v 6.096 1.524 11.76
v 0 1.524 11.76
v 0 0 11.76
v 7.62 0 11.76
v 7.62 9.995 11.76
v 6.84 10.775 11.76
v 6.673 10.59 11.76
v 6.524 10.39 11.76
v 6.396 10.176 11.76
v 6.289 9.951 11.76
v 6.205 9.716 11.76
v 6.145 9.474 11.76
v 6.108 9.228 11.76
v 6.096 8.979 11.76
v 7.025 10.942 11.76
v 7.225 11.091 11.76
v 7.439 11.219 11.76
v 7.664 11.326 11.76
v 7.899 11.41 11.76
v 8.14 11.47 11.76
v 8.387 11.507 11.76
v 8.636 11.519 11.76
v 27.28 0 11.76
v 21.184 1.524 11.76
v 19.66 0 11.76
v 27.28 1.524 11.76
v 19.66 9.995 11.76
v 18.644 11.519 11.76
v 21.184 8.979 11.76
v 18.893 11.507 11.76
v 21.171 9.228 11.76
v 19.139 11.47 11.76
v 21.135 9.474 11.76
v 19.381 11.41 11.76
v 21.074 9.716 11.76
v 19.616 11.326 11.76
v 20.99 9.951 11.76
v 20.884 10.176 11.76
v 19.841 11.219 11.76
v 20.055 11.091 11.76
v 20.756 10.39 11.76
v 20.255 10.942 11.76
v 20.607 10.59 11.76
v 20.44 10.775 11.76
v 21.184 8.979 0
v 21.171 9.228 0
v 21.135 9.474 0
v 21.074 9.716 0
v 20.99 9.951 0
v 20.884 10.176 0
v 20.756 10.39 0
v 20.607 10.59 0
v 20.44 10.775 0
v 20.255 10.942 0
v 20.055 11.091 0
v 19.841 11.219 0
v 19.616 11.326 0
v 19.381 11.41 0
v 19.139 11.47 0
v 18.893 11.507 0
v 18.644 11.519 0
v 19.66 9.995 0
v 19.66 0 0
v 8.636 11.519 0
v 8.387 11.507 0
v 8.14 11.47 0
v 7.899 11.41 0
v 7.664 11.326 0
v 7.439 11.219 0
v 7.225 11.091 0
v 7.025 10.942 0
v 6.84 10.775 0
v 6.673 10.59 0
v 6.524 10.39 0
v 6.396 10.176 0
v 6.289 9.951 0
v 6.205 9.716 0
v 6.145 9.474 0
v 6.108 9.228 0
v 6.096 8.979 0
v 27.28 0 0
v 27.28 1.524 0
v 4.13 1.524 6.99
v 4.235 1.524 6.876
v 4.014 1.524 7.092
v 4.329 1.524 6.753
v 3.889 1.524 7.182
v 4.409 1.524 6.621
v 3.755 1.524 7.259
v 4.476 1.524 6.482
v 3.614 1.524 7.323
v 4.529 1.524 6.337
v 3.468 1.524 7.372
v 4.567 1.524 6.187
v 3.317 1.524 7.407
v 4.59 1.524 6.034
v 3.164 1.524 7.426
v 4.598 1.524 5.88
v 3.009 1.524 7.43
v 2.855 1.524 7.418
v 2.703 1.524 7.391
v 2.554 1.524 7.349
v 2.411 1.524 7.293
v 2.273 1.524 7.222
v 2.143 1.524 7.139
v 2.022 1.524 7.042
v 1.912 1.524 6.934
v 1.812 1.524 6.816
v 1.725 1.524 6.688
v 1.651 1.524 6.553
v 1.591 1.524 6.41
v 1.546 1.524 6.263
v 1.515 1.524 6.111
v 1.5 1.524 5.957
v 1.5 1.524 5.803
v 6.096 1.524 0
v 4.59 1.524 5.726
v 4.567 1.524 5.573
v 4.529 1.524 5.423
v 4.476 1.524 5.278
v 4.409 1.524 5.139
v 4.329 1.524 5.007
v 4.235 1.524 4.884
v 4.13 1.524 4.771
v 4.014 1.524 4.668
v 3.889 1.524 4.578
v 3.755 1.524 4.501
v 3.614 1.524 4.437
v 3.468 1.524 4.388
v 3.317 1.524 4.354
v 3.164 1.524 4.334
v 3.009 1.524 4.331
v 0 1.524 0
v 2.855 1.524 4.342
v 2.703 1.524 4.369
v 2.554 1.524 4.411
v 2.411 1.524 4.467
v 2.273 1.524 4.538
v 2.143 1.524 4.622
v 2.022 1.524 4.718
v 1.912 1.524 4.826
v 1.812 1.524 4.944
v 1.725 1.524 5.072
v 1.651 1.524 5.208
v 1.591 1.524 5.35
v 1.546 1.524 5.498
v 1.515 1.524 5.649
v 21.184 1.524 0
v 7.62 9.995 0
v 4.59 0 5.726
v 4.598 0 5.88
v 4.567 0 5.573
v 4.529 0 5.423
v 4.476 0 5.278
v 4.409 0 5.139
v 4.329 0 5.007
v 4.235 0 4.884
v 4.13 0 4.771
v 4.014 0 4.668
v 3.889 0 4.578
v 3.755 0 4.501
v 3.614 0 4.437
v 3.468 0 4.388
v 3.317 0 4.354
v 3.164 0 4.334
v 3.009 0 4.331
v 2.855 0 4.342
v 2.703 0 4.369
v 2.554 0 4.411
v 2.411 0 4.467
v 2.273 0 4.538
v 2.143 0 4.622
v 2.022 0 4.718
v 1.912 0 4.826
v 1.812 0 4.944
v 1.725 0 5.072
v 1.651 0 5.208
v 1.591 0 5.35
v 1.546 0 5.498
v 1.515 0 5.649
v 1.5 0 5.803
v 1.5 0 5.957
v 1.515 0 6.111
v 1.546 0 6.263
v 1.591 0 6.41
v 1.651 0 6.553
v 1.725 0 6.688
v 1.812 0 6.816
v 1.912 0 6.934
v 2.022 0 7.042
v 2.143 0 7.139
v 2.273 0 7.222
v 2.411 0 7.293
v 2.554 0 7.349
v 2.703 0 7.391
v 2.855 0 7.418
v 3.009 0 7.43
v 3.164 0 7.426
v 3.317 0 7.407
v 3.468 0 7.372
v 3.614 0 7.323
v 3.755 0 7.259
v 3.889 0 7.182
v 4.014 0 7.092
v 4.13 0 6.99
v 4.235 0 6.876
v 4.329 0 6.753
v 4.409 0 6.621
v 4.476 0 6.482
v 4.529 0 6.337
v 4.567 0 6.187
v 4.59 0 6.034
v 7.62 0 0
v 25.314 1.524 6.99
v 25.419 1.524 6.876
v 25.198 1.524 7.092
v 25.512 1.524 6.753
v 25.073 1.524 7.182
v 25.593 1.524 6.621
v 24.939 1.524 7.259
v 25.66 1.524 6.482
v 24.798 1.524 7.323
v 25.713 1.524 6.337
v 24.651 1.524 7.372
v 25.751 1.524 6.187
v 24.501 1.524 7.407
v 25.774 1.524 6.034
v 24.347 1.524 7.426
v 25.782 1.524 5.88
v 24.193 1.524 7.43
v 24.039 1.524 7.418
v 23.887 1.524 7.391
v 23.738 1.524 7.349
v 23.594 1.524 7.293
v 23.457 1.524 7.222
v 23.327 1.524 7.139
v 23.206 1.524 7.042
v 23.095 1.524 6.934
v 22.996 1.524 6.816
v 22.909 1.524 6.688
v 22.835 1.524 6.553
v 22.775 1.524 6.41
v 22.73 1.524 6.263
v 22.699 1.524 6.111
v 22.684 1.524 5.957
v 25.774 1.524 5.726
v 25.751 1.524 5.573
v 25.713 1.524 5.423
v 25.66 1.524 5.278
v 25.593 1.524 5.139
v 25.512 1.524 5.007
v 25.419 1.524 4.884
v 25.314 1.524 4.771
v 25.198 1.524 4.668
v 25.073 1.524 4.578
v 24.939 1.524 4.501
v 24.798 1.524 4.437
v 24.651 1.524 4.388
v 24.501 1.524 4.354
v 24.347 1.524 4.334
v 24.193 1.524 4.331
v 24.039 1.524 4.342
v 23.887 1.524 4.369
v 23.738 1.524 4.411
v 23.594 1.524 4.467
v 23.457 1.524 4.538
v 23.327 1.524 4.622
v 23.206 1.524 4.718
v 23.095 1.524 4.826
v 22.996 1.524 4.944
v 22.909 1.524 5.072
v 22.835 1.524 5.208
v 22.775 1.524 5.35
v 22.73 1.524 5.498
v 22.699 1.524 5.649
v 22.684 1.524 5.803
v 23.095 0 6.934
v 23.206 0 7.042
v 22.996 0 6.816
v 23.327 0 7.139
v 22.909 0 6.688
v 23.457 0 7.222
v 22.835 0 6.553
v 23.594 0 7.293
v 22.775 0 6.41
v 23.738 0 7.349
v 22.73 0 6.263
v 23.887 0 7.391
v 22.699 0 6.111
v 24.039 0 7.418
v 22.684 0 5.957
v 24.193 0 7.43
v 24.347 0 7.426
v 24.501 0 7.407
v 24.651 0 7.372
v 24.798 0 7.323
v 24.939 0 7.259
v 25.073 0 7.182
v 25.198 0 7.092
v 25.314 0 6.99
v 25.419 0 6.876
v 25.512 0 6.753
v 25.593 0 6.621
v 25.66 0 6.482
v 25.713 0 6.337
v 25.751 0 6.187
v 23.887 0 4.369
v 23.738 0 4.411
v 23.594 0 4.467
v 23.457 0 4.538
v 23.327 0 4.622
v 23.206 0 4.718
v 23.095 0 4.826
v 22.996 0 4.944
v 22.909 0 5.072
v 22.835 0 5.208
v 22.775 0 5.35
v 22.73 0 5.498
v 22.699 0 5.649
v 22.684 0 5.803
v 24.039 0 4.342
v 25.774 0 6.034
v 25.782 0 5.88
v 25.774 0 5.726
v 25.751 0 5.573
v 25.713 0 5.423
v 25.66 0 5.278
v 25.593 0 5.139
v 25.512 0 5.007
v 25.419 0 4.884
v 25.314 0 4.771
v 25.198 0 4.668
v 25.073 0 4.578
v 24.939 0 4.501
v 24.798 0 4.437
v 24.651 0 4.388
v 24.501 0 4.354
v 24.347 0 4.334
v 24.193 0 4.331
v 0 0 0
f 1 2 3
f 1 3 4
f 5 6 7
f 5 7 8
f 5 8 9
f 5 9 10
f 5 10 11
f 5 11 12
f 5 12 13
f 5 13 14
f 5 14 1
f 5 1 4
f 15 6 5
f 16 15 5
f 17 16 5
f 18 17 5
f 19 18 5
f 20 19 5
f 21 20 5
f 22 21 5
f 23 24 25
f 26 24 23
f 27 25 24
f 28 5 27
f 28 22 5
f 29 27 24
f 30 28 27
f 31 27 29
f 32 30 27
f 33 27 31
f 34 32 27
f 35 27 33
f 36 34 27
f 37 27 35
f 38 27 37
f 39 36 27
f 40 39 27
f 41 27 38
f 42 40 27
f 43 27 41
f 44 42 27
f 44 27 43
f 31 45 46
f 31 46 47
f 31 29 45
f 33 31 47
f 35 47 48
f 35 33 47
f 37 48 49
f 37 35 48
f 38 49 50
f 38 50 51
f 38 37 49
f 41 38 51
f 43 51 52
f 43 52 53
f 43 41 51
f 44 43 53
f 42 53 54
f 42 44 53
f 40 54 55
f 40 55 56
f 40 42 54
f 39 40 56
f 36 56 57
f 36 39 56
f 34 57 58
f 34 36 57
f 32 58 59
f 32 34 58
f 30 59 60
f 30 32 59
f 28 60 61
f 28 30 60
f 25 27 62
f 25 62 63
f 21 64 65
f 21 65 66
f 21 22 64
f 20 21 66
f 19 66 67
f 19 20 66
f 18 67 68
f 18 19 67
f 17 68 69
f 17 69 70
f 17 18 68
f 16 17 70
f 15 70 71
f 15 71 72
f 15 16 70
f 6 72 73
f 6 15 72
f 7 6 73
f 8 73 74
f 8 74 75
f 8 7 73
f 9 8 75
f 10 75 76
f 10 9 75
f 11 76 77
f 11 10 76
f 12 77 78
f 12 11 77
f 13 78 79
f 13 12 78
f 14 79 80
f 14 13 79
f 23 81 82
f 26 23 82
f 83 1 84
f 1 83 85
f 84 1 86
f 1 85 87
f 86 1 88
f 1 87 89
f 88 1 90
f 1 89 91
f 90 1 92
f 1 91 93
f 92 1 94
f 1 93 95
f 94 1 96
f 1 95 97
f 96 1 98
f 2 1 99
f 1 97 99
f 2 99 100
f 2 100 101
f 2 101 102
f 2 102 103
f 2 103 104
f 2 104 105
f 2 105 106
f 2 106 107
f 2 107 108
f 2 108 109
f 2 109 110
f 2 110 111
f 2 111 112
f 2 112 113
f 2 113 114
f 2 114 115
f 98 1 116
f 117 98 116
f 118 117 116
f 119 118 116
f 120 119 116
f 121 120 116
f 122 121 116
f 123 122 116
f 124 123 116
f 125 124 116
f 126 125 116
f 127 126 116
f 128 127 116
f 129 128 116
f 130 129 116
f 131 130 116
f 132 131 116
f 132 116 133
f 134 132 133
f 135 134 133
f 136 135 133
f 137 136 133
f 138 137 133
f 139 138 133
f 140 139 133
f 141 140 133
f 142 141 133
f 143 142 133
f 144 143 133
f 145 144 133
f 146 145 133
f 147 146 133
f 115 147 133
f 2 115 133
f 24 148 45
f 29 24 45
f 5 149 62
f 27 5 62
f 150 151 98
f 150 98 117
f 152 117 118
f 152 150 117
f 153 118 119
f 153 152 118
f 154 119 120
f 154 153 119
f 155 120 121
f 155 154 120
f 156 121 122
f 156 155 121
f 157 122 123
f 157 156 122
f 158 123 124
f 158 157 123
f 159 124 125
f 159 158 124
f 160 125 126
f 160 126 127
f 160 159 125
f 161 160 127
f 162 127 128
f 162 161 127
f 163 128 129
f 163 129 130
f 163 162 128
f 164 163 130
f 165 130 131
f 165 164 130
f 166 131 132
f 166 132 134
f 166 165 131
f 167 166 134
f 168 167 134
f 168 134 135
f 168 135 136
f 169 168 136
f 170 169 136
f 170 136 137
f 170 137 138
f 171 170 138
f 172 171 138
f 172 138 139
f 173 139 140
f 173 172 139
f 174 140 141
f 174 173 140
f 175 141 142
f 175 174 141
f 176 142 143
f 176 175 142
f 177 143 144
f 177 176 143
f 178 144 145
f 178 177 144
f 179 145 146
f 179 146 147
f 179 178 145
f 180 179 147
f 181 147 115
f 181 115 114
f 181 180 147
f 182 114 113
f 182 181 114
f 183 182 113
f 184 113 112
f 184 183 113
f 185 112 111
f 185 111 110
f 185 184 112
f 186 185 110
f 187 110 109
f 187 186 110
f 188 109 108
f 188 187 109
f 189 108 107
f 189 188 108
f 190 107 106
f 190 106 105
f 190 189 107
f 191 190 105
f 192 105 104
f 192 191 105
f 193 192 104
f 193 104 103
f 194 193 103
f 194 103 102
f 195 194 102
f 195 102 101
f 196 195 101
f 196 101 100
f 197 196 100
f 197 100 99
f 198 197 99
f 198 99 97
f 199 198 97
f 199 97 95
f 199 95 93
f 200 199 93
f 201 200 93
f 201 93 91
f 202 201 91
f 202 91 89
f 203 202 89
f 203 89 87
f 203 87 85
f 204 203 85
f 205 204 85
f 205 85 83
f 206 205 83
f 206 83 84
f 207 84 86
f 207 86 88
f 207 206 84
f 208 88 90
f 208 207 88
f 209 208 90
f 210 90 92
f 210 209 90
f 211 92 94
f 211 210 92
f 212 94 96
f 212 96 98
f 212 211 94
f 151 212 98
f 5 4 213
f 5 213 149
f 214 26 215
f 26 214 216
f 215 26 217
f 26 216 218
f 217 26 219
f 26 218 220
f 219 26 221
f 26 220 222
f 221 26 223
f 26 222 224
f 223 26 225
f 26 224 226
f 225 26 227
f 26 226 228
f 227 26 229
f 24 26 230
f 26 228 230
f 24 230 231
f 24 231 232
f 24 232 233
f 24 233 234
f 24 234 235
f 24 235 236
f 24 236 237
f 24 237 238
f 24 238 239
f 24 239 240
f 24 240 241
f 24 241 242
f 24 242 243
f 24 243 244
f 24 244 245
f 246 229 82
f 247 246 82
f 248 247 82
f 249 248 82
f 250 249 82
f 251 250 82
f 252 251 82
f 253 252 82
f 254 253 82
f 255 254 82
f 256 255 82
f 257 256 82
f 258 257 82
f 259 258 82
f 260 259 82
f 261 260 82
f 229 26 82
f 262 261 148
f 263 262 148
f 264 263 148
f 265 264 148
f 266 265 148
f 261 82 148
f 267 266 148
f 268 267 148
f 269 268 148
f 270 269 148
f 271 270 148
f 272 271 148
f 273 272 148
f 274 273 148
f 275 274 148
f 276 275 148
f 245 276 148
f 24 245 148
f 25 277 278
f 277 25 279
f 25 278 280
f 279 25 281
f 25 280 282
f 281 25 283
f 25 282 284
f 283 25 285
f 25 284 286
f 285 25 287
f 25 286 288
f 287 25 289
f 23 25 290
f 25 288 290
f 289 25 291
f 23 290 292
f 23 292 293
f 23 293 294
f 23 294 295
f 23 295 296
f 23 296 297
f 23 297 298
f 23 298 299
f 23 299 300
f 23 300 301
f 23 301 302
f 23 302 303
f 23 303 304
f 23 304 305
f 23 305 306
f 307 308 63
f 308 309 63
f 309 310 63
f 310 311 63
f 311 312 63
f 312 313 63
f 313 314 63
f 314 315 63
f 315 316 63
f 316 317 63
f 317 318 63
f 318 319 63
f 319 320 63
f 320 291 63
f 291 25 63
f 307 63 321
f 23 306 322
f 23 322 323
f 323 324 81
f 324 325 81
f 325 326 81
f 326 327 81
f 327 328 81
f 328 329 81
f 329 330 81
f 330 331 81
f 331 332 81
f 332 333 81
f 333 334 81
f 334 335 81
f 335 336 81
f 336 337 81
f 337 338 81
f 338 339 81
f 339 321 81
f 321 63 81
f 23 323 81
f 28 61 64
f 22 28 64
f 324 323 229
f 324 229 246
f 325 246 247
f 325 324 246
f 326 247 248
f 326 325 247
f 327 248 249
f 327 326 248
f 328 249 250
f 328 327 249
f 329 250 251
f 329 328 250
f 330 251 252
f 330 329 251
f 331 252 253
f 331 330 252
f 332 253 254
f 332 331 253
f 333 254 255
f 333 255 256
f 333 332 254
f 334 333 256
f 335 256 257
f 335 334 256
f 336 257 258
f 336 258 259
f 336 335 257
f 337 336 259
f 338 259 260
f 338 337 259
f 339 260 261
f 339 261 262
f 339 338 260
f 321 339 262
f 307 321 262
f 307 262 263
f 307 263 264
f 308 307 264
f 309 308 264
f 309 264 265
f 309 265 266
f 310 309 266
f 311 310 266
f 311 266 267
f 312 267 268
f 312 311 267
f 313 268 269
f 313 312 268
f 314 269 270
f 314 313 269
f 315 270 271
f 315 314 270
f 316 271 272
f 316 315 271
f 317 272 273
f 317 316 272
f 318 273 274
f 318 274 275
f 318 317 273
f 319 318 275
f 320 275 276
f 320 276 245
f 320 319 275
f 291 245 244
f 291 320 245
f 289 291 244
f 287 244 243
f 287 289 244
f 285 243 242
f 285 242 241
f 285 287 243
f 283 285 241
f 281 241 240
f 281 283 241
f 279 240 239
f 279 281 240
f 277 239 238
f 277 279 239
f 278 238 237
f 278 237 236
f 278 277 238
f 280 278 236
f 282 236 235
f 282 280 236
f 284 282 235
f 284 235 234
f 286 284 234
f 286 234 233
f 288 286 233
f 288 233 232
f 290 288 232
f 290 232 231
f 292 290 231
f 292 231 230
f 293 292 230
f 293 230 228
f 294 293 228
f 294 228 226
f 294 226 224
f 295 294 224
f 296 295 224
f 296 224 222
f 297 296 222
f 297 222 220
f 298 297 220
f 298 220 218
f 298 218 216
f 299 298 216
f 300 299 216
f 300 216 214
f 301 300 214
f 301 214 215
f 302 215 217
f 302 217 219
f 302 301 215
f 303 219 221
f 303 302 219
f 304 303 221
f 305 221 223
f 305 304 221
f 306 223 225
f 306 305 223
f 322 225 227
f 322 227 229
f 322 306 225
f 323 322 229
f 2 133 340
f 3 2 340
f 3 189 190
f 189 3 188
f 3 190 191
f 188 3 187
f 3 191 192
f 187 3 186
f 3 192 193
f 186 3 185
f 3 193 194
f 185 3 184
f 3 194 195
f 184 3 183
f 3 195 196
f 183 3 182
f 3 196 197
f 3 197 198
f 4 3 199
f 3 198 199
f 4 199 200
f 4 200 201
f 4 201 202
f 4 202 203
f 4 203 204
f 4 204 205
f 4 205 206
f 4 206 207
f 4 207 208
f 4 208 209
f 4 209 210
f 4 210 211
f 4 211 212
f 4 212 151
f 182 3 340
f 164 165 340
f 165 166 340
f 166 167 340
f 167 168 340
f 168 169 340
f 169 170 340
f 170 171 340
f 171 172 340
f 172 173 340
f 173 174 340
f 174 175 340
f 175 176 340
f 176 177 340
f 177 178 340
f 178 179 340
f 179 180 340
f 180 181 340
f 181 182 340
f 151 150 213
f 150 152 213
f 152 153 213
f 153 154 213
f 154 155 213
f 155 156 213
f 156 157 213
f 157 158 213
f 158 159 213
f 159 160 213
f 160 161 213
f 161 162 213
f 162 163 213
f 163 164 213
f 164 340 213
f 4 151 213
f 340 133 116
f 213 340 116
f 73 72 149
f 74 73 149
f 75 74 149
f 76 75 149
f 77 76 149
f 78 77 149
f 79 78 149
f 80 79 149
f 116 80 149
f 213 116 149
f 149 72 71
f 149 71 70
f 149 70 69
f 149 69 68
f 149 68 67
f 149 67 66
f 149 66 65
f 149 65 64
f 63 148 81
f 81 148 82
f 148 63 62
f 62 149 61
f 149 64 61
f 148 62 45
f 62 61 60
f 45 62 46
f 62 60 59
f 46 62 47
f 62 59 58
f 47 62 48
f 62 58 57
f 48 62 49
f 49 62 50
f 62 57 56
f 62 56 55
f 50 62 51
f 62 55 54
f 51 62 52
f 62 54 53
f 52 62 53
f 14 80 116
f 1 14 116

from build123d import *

# Parameters (mm, degrees)
BOSS_EXTRUDE1_DEPTH = 11.7602
FILLET2_R           = 2.54
FILLET3_R           = 2.54
SKETCH3_R           = 1.55
CUT_EXTRUDE1_DEPTH  = 1.524


with BuildPart() as part:
    # Sketch2 → Boss-Extrude1 (new body)
    with BuildSketch(Plane.XY):
        Polygon((0, 0), (7.62, 0), (7.62, 9.9949), (19.6596, 9.9949), (19.6596, 0), (27.2796, 0), (27.2796, 1.524), (21.1836, 1.524), (21.1836, 11.5189), (6.096, 11.5189), (6.096, 1.524), (0, 1.524), align=None)
    extrude(amount=BOSS_EXTRUDE1_DEPTH)

    # Fillet2
    fillet2_edges = [part.edges().sort_by_distance(p)[0] for p in [
        (21.1836, 11.5189, 5.8801),
    ]]
    fillet(fillet2_edges, radius=FILLET2_R)

    # Fillet3
    fillet3_edges = [part.edges().sort_by_distance(p)[0] for p in [
        (6.096, 11.5189, 5.8801),
    ]]
    fillet(fillet3_edges, radius=FILLET3_R)

    # Sketch3 → Cut-Extrude1 (cut)
    with BuildSketch(Plane(origin=(0, 0, 0), x_dir=(1, 0, 0), z_dir=(0, 1, 0))):
        with Locations((3.048, -5.8801)):
            Circle(SKETCH3_R)
        with Locations((24.2316, -5.8801)):
            Circle(SKETCH3_R)
    extrude(amount=CUT_EXTRUDE1_DEPTH, mode=Mode.SUBTRACT)


solid = part.part
